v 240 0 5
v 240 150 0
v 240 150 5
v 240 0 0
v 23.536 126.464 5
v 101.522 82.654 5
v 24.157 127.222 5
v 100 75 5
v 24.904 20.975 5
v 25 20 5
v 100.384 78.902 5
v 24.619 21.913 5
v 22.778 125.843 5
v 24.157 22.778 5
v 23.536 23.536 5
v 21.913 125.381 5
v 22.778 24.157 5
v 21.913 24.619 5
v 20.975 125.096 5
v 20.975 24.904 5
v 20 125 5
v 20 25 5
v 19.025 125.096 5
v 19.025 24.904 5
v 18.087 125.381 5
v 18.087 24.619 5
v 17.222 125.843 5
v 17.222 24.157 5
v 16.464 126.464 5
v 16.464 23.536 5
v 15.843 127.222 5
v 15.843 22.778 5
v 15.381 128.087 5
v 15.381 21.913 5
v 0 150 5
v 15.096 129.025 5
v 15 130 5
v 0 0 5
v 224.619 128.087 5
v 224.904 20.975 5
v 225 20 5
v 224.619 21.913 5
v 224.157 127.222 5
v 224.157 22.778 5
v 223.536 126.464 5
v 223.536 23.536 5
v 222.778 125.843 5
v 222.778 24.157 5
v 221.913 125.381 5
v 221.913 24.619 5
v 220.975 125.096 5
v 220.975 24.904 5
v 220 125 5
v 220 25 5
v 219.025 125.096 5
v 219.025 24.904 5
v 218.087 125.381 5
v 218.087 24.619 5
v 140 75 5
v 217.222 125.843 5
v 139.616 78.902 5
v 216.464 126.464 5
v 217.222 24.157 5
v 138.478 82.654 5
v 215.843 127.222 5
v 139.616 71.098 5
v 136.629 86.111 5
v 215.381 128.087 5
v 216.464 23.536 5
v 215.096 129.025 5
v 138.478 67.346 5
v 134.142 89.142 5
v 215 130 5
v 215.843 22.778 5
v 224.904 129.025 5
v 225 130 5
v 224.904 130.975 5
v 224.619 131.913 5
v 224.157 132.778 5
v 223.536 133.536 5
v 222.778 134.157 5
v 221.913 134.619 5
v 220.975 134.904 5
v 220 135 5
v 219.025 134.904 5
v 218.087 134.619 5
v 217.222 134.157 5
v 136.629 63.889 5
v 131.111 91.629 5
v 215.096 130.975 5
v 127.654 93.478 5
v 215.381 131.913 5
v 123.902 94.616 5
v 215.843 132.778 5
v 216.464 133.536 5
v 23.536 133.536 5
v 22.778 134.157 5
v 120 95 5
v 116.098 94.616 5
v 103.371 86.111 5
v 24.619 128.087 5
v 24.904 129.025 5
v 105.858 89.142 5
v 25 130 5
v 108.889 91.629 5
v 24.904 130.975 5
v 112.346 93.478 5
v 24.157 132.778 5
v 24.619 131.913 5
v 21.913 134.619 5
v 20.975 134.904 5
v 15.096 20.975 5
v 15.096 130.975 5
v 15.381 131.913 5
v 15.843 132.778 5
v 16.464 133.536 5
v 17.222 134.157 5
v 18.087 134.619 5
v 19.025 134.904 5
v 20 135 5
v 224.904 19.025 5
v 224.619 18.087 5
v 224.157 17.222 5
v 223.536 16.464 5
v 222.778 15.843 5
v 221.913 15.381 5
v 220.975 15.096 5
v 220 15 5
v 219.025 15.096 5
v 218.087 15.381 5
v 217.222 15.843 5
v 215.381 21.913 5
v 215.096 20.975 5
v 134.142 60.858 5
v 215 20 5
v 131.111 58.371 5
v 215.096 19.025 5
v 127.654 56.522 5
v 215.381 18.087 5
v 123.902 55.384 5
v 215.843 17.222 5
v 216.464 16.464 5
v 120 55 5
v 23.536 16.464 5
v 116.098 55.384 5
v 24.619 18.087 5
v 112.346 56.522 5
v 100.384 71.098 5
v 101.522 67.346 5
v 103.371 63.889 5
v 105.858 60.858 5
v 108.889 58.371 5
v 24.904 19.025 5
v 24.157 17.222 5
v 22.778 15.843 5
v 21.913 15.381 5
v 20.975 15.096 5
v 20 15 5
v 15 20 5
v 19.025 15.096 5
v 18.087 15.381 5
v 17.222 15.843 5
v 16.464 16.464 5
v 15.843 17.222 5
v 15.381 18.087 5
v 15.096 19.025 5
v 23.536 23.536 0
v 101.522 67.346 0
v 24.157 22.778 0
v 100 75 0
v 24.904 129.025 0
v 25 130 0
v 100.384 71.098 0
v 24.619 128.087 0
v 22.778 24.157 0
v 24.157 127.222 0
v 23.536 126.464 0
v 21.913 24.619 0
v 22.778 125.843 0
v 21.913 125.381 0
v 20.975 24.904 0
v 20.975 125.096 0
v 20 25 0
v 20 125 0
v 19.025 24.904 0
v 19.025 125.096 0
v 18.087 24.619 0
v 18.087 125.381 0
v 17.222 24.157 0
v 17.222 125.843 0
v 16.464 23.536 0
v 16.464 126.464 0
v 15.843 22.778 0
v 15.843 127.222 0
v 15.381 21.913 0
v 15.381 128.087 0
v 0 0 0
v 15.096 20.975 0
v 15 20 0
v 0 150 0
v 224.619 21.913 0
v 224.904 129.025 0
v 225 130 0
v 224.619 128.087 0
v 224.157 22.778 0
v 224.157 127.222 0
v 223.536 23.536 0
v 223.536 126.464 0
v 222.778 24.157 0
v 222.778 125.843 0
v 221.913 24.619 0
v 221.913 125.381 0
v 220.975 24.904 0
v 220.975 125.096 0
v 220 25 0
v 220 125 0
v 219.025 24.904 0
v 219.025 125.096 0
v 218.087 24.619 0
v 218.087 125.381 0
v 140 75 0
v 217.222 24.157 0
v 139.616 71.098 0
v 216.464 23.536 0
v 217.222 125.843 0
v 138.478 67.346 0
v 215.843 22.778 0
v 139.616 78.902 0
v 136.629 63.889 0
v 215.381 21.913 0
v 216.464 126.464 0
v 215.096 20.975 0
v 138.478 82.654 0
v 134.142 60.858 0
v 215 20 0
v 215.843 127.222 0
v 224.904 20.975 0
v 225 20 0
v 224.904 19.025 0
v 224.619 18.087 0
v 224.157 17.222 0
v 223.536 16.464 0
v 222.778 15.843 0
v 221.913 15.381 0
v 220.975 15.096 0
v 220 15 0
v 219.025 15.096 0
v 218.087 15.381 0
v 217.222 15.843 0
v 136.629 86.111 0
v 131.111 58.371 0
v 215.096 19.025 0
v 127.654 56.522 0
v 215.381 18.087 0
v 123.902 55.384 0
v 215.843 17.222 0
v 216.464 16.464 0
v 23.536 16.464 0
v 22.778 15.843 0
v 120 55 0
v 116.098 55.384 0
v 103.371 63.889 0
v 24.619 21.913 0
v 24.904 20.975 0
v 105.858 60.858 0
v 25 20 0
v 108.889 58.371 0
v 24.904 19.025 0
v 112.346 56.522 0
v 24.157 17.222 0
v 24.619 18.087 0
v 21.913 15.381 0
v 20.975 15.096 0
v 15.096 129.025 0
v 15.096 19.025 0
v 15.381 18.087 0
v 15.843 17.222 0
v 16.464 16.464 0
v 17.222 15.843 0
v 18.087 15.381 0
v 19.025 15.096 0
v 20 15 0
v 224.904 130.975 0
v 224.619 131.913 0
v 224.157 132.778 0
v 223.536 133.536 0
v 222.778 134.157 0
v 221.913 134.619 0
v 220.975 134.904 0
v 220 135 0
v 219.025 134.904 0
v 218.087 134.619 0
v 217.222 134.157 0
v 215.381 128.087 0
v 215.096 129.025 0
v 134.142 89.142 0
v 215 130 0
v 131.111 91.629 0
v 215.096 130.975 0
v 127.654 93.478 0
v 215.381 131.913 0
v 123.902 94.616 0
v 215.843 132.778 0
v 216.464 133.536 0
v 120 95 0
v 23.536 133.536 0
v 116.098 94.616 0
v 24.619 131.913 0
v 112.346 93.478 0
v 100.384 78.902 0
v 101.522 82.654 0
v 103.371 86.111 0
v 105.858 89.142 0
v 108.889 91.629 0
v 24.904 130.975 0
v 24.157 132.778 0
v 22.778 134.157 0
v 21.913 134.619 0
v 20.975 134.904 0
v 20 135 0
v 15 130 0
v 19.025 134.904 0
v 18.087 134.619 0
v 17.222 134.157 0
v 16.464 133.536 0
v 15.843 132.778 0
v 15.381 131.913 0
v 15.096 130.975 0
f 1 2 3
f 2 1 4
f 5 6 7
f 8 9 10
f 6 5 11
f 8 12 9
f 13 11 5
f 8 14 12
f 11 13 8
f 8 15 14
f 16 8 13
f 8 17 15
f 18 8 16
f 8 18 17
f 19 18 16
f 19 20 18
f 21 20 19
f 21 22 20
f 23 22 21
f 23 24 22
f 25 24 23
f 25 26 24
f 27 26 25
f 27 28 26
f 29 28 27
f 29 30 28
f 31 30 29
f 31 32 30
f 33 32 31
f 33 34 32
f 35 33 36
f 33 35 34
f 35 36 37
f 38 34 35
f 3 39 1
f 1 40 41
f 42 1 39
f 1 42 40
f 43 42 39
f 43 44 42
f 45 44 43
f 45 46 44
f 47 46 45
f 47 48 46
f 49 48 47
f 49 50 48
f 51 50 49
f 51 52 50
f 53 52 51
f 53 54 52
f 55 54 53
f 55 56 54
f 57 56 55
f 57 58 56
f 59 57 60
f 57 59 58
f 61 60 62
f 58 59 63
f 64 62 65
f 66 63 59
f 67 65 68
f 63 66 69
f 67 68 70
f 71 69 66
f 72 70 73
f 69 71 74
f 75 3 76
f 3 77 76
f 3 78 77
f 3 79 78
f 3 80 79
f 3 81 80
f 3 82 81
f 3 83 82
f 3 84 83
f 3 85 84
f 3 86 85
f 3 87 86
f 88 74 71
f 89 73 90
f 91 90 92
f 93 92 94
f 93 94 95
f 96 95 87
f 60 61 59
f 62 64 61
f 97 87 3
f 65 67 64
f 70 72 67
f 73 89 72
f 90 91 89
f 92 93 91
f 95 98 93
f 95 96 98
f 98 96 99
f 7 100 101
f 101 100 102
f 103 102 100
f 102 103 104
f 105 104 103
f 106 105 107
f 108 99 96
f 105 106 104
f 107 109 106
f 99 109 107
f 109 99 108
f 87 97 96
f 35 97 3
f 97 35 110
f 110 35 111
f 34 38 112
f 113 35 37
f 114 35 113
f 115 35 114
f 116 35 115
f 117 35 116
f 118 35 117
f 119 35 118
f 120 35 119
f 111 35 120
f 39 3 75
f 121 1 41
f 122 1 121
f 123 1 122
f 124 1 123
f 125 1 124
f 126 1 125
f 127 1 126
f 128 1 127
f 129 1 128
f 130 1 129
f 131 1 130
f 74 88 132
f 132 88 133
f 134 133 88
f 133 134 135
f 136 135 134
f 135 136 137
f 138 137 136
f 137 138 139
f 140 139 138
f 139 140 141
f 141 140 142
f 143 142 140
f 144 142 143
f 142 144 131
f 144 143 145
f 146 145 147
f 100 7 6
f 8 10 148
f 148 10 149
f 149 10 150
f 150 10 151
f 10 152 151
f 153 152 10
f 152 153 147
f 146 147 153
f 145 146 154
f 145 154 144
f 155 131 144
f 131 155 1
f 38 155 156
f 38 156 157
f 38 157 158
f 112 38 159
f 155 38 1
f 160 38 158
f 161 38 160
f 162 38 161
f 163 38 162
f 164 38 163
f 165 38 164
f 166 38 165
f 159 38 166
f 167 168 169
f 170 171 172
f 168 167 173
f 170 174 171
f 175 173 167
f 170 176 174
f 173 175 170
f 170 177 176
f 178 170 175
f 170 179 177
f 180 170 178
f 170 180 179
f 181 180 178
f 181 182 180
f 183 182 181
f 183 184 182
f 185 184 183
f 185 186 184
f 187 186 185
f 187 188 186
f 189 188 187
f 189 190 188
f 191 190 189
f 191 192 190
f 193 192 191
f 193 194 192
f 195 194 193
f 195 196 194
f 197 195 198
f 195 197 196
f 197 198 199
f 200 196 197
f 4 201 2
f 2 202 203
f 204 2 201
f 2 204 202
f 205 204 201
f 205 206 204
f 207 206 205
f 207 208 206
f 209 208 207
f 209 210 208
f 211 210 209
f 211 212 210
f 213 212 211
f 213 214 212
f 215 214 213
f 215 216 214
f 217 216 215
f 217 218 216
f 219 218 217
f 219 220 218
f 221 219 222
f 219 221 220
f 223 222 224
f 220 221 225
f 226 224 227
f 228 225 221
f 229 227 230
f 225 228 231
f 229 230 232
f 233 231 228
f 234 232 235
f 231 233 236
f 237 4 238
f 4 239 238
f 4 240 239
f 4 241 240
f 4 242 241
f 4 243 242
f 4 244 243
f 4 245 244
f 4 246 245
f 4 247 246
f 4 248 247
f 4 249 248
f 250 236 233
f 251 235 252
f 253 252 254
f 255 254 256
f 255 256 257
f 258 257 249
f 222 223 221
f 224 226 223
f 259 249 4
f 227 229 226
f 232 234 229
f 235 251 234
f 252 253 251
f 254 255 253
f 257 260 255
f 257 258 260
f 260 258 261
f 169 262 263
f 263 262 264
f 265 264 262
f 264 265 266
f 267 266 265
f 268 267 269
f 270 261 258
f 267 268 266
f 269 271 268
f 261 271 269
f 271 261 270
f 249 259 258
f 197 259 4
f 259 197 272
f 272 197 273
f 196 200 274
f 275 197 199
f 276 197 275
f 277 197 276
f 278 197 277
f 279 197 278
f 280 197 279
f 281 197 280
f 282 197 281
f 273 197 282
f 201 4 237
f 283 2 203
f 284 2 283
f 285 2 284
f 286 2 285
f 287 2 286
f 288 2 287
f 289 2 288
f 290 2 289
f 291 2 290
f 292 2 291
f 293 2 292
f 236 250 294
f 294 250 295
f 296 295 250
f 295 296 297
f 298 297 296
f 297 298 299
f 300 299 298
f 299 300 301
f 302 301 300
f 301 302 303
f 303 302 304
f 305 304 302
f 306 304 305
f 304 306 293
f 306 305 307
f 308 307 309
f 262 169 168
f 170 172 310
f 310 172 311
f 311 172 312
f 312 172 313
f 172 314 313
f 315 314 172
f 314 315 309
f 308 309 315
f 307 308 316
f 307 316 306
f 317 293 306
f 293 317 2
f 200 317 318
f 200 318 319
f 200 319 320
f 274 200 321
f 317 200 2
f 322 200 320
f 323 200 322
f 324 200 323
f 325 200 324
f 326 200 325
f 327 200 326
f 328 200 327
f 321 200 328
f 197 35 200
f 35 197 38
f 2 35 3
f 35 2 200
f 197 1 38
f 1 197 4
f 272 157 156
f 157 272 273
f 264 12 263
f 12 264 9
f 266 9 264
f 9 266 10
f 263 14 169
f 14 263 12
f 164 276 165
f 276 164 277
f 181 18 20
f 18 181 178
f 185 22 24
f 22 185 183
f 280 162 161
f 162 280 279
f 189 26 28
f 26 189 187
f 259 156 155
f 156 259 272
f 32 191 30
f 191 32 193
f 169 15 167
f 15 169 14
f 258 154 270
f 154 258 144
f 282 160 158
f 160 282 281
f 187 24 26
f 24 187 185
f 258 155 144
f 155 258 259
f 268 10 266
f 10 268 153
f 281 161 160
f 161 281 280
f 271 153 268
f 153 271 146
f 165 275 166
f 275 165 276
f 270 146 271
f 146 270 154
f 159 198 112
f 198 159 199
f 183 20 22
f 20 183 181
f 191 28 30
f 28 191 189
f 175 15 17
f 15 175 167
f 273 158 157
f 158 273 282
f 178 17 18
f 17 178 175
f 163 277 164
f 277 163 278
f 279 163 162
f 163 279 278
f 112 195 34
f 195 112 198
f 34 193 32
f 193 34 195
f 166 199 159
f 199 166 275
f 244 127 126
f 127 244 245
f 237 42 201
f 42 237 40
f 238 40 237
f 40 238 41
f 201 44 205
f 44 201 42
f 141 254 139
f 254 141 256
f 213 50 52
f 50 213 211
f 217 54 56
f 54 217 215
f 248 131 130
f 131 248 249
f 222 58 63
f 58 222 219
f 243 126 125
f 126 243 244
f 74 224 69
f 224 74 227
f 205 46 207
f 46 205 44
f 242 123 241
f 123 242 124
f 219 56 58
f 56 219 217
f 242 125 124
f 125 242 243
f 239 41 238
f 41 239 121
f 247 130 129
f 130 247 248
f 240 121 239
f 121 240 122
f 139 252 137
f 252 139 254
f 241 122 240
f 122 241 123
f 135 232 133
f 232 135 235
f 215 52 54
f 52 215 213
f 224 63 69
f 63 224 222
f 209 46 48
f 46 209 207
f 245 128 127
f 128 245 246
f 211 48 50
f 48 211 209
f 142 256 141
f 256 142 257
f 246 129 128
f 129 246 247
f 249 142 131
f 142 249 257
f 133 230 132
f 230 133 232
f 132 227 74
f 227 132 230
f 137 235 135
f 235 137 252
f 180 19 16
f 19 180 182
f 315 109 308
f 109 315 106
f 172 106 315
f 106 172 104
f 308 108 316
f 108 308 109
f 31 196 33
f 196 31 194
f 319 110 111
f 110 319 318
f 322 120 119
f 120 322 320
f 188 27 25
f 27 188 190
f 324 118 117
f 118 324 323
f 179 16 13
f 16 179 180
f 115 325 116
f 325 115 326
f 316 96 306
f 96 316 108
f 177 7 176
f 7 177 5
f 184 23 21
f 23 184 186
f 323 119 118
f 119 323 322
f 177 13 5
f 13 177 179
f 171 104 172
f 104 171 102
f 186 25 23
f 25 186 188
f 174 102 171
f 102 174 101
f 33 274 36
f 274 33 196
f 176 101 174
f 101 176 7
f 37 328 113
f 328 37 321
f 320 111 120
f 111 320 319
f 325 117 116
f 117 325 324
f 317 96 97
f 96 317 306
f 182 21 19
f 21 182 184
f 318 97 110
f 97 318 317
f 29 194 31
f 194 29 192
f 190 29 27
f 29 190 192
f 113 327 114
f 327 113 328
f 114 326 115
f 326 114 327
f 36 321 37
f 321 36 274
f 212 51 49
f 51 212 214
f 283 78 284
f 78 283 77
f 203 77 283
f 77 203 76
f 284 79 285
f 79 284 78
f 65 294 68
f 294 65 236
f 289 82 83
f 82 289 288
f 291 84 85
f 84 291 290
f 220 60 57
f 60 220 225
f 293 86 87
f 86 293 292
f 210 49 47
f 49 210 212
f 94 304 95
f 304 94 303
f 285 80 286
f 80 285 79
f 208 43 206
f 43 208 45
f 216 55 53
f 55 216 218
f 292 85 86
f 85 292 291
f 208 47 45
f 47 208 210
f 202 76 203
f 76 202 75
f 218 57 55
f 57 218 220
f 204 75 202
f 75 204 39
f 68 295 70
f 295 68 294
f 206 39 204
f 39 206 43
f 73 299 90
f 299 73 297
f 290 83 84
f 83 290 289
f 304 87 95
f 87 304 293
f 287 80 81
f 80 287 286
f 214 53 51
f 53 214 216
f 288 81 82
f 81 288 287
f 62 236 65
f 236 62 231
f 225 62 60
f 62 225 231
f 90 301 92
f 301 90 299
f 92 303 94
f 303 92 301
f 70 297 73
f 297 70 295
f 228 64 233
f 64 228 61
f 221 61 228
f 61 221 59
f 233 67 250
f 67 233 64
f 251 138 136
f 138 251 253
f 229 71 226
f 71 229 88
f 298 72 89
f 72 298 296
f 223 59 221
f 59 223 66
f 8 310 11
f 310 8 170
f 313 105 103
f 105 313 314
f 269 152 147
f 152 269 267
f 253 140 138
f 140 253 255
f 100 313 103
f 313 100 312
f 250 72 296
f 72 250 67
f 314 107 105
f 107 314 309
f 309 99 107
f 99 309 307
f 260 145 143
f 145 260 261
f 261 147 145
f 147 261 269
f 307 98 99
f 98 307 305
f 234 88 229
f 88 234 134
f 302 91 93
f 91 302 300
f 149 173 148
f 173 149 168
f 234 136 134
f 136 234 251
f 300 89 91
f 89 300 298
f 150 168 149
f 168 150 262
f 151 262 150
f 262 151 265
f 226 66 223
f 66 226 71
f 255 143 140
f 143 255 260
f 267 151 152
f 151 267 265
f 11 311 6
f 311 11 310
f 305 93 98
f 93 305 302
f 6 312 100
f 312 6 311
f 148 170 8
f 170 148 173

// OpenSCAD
$fn = 32;

// ----------------------------------------------------------------------
// Big plate: 200-250 mm adapter plate
// ----------------------------------------------------------------------

// --- parameters (mm) ---
plate_l = 240;            // plate length, X
plate_w = 150;            // plate width, Y
plate_t = 5;              // plate thickness, Z
corner_d = 10;            // corner hole diameter
corner_in = 20;           // corner hole inset from the edges
bore_d = 40;              // central bore
fit_tol = 0.02;           // tolerance for press fits, mm
free_tol = 0.2;           // tolerance for clearance fits, mm

difference() {
  cube([plate_l, plate_w, plate_t]);
  translate([corner_in, corner_in, -1]) cylinder(h = plate_t + 2, d = corner_d);
  translate([plate_l - corner_in, corner_in, -1]) cylinder(h = plate_t + 2, d = corner_d);
  translate([corner_in, plate_w - corner_in, -1]) cylinder(h = plate_t + 2, d = corner_d);
  translate([plate_l - corner_in, plate_w - corner_in, -1]) cylinder(h = plate_t + 2, d = corner_d);
  translate([plate_l / 2, plate_w / 2, -1]) cylinder(h = plate_t + 2, d = bore_d);
}
